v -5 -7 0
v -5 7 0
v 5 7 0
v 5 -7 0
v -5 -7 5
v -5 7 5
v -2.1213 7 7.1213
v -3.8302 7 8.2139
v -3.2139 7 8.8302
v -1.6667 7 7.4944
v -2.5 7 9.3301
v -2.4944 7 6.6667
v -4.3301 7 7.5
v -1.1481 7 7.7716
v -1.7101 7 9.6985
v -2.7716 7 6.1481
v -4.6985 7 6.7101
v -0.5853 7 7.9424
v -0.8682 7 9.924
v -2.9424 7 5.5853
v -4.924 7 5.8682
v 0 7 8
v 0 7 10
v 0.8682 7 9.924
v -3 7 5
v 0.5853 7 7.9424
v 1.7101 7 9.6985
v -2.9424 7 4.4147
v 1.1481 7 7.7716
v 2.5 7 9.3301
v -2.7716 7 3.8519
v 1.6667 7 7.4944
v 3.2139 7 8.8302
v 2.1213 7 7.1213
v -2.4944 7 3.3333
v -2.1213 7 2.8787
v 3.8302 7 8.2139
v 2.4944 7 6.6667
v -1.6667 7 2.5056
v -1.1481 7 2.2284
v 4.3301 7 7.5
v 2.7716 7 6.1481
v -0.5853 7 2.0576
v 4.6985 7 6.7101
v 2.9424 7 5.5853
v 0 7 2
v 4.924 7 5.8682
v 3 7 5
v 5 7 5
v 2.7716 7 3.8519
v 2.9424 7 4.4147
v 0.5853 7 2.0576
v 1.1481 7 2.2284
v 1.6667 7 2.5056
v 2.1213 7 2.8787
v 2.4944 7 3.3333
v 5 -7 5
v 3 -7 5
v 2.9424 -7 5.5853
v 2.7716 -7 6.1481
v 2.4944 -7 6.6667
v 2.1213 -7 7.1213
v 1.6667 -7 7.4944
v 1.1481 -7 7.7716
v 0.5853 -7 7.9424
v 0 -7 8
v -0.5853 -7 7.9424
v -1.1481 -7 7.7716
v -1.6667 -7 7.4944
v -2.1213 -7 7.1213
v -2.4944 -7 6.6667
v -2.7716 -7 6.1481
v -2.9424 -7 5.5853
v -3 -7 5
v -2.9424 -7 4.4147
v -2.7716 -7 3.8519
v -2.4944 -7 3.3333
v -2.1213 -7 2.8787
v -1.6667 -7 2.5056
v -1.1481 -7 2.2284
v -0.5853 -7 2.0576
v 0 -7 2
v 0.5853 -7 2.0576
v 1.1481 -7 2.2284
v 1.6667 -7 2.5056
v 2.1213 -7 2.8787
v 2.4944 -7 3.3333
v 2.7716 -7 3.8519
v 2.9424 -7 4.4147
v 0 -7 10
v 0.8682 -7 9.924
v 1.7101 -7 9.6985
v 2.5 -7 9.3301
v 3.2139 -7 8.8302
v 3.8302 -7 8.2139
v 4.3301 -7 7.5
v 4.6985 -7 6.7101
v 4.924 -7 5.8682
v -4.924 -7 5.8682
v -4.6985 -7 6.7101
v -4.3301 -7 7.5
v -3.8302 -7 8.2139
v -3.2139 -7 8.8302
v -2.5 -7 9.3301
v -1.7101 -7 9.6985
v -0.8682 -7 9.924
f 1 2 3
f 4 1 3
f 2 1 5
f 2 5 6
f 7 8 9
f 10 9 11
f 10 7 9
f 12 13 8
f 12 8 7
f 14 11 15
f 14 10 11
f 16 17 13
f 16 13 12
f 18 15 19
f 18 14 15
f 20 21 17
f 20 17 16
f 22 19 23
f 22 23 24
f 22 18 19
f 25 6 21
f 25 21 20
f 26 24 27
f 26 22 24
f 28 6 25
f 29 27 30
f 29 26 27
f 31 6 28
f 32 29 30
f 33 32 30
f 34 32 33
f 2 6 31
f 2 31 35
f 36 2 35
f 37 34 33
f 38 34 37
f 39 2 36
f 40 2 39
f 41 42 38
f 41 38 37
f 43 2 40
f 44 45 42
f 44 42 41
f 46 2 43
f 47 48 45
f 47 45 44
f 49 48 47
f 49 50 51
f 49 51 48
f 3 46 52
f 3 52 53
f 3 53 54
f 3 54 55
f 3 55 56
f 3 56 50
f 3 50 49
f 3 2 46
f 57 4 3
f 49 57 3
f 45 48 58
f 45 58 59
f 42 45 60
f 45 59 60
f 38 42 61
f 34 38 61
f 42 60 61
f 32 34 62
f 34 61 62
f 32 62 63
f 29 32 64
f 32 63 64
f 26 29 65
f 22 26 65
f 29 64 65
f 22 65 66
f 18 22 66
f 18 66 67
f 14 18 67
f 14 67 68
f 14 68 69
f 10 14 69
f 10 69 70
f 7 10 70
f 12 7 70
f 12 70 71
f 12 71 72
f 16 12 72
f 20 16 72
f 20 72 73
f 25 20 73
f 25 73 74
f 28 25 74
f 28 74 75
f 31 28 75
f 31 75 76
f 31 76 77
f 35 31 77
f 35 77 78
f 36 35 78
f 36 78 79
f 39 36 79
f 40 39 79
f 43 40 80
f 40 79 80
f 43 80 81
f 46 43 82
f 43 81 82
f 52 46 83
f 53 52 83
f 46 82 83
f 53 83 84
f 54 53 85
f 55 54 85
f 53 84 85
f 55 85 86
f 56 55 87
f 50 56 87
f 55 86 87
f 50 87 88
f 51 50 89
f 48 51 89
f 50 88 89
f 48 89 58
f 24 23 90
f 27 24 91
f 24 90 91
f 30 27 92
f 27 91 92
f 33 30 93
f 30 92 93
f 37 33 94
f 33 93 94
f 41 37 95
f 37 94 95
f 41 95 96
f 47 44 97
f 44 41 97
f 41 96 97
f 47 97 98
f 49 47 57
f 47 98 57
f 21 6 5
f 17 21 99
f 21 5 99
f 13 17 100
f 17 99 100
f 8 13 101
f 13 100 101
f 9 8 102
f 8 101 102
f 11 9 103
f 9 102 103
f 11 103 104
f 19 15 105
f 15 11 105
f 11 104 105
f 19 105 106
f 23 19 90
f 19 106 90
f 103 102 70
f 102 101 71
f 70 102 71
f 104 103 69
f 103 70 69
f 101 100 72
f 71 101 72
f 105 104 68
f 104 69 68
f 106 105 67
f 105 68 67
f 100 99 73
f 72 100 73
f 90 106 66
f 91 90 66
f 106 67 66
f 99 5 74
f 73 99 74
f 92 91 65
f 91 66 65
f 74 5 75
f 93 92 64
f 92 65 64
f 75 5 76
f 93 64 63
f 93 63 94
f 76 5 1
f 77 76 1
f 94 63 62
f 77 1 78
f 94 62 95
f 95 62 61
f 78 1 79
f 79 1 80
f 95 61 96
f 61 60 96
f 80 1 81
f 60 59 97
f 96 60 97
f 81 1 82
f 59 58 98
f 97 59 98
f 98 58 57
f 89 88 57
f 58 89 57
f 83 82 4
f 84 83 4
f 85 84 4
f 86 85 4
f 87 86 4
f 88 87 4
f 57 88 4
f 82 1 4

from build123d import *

# Parameters (mm, degrees)
F0_W     = 10
F0_H     = 14
F1_DEPTH = 10
F2_R     = 3
F3_DEPTH = 14.001


with BuildPart() as f1:
    # F0 (on Top) → F1 (new body)
    with BuildSketch(Plane.XY):
        Rectangle(F0_W, F0_H)
    extrude(amount=F1_DEPTH)

    # F2 (on face) → F3 (cut, through all)
    with BuildSketch(Plane.XZ.offset(7)):
        with Locations((0, 5)):
            Circle(F2_R)
        with BuildLine():
            ThreePointArc((-5, 5), (-3.535534, 8.535534), (0, 10))
            Line((0, 10), (-5, 10))
            Line((-5, 10), (-5, 5))
        make_face()
        with BuildLine():
            Line((5, 10), (0, 10))
            ThreePointArc((0, 10), (3.535534, 8.535534), (5, 5))
            Line((5, 5), (5, 10))
        make_face()
    extrude(amount=-F3_DEPTH, mode=Mode.SUBTRACT)


solid = f1.part
